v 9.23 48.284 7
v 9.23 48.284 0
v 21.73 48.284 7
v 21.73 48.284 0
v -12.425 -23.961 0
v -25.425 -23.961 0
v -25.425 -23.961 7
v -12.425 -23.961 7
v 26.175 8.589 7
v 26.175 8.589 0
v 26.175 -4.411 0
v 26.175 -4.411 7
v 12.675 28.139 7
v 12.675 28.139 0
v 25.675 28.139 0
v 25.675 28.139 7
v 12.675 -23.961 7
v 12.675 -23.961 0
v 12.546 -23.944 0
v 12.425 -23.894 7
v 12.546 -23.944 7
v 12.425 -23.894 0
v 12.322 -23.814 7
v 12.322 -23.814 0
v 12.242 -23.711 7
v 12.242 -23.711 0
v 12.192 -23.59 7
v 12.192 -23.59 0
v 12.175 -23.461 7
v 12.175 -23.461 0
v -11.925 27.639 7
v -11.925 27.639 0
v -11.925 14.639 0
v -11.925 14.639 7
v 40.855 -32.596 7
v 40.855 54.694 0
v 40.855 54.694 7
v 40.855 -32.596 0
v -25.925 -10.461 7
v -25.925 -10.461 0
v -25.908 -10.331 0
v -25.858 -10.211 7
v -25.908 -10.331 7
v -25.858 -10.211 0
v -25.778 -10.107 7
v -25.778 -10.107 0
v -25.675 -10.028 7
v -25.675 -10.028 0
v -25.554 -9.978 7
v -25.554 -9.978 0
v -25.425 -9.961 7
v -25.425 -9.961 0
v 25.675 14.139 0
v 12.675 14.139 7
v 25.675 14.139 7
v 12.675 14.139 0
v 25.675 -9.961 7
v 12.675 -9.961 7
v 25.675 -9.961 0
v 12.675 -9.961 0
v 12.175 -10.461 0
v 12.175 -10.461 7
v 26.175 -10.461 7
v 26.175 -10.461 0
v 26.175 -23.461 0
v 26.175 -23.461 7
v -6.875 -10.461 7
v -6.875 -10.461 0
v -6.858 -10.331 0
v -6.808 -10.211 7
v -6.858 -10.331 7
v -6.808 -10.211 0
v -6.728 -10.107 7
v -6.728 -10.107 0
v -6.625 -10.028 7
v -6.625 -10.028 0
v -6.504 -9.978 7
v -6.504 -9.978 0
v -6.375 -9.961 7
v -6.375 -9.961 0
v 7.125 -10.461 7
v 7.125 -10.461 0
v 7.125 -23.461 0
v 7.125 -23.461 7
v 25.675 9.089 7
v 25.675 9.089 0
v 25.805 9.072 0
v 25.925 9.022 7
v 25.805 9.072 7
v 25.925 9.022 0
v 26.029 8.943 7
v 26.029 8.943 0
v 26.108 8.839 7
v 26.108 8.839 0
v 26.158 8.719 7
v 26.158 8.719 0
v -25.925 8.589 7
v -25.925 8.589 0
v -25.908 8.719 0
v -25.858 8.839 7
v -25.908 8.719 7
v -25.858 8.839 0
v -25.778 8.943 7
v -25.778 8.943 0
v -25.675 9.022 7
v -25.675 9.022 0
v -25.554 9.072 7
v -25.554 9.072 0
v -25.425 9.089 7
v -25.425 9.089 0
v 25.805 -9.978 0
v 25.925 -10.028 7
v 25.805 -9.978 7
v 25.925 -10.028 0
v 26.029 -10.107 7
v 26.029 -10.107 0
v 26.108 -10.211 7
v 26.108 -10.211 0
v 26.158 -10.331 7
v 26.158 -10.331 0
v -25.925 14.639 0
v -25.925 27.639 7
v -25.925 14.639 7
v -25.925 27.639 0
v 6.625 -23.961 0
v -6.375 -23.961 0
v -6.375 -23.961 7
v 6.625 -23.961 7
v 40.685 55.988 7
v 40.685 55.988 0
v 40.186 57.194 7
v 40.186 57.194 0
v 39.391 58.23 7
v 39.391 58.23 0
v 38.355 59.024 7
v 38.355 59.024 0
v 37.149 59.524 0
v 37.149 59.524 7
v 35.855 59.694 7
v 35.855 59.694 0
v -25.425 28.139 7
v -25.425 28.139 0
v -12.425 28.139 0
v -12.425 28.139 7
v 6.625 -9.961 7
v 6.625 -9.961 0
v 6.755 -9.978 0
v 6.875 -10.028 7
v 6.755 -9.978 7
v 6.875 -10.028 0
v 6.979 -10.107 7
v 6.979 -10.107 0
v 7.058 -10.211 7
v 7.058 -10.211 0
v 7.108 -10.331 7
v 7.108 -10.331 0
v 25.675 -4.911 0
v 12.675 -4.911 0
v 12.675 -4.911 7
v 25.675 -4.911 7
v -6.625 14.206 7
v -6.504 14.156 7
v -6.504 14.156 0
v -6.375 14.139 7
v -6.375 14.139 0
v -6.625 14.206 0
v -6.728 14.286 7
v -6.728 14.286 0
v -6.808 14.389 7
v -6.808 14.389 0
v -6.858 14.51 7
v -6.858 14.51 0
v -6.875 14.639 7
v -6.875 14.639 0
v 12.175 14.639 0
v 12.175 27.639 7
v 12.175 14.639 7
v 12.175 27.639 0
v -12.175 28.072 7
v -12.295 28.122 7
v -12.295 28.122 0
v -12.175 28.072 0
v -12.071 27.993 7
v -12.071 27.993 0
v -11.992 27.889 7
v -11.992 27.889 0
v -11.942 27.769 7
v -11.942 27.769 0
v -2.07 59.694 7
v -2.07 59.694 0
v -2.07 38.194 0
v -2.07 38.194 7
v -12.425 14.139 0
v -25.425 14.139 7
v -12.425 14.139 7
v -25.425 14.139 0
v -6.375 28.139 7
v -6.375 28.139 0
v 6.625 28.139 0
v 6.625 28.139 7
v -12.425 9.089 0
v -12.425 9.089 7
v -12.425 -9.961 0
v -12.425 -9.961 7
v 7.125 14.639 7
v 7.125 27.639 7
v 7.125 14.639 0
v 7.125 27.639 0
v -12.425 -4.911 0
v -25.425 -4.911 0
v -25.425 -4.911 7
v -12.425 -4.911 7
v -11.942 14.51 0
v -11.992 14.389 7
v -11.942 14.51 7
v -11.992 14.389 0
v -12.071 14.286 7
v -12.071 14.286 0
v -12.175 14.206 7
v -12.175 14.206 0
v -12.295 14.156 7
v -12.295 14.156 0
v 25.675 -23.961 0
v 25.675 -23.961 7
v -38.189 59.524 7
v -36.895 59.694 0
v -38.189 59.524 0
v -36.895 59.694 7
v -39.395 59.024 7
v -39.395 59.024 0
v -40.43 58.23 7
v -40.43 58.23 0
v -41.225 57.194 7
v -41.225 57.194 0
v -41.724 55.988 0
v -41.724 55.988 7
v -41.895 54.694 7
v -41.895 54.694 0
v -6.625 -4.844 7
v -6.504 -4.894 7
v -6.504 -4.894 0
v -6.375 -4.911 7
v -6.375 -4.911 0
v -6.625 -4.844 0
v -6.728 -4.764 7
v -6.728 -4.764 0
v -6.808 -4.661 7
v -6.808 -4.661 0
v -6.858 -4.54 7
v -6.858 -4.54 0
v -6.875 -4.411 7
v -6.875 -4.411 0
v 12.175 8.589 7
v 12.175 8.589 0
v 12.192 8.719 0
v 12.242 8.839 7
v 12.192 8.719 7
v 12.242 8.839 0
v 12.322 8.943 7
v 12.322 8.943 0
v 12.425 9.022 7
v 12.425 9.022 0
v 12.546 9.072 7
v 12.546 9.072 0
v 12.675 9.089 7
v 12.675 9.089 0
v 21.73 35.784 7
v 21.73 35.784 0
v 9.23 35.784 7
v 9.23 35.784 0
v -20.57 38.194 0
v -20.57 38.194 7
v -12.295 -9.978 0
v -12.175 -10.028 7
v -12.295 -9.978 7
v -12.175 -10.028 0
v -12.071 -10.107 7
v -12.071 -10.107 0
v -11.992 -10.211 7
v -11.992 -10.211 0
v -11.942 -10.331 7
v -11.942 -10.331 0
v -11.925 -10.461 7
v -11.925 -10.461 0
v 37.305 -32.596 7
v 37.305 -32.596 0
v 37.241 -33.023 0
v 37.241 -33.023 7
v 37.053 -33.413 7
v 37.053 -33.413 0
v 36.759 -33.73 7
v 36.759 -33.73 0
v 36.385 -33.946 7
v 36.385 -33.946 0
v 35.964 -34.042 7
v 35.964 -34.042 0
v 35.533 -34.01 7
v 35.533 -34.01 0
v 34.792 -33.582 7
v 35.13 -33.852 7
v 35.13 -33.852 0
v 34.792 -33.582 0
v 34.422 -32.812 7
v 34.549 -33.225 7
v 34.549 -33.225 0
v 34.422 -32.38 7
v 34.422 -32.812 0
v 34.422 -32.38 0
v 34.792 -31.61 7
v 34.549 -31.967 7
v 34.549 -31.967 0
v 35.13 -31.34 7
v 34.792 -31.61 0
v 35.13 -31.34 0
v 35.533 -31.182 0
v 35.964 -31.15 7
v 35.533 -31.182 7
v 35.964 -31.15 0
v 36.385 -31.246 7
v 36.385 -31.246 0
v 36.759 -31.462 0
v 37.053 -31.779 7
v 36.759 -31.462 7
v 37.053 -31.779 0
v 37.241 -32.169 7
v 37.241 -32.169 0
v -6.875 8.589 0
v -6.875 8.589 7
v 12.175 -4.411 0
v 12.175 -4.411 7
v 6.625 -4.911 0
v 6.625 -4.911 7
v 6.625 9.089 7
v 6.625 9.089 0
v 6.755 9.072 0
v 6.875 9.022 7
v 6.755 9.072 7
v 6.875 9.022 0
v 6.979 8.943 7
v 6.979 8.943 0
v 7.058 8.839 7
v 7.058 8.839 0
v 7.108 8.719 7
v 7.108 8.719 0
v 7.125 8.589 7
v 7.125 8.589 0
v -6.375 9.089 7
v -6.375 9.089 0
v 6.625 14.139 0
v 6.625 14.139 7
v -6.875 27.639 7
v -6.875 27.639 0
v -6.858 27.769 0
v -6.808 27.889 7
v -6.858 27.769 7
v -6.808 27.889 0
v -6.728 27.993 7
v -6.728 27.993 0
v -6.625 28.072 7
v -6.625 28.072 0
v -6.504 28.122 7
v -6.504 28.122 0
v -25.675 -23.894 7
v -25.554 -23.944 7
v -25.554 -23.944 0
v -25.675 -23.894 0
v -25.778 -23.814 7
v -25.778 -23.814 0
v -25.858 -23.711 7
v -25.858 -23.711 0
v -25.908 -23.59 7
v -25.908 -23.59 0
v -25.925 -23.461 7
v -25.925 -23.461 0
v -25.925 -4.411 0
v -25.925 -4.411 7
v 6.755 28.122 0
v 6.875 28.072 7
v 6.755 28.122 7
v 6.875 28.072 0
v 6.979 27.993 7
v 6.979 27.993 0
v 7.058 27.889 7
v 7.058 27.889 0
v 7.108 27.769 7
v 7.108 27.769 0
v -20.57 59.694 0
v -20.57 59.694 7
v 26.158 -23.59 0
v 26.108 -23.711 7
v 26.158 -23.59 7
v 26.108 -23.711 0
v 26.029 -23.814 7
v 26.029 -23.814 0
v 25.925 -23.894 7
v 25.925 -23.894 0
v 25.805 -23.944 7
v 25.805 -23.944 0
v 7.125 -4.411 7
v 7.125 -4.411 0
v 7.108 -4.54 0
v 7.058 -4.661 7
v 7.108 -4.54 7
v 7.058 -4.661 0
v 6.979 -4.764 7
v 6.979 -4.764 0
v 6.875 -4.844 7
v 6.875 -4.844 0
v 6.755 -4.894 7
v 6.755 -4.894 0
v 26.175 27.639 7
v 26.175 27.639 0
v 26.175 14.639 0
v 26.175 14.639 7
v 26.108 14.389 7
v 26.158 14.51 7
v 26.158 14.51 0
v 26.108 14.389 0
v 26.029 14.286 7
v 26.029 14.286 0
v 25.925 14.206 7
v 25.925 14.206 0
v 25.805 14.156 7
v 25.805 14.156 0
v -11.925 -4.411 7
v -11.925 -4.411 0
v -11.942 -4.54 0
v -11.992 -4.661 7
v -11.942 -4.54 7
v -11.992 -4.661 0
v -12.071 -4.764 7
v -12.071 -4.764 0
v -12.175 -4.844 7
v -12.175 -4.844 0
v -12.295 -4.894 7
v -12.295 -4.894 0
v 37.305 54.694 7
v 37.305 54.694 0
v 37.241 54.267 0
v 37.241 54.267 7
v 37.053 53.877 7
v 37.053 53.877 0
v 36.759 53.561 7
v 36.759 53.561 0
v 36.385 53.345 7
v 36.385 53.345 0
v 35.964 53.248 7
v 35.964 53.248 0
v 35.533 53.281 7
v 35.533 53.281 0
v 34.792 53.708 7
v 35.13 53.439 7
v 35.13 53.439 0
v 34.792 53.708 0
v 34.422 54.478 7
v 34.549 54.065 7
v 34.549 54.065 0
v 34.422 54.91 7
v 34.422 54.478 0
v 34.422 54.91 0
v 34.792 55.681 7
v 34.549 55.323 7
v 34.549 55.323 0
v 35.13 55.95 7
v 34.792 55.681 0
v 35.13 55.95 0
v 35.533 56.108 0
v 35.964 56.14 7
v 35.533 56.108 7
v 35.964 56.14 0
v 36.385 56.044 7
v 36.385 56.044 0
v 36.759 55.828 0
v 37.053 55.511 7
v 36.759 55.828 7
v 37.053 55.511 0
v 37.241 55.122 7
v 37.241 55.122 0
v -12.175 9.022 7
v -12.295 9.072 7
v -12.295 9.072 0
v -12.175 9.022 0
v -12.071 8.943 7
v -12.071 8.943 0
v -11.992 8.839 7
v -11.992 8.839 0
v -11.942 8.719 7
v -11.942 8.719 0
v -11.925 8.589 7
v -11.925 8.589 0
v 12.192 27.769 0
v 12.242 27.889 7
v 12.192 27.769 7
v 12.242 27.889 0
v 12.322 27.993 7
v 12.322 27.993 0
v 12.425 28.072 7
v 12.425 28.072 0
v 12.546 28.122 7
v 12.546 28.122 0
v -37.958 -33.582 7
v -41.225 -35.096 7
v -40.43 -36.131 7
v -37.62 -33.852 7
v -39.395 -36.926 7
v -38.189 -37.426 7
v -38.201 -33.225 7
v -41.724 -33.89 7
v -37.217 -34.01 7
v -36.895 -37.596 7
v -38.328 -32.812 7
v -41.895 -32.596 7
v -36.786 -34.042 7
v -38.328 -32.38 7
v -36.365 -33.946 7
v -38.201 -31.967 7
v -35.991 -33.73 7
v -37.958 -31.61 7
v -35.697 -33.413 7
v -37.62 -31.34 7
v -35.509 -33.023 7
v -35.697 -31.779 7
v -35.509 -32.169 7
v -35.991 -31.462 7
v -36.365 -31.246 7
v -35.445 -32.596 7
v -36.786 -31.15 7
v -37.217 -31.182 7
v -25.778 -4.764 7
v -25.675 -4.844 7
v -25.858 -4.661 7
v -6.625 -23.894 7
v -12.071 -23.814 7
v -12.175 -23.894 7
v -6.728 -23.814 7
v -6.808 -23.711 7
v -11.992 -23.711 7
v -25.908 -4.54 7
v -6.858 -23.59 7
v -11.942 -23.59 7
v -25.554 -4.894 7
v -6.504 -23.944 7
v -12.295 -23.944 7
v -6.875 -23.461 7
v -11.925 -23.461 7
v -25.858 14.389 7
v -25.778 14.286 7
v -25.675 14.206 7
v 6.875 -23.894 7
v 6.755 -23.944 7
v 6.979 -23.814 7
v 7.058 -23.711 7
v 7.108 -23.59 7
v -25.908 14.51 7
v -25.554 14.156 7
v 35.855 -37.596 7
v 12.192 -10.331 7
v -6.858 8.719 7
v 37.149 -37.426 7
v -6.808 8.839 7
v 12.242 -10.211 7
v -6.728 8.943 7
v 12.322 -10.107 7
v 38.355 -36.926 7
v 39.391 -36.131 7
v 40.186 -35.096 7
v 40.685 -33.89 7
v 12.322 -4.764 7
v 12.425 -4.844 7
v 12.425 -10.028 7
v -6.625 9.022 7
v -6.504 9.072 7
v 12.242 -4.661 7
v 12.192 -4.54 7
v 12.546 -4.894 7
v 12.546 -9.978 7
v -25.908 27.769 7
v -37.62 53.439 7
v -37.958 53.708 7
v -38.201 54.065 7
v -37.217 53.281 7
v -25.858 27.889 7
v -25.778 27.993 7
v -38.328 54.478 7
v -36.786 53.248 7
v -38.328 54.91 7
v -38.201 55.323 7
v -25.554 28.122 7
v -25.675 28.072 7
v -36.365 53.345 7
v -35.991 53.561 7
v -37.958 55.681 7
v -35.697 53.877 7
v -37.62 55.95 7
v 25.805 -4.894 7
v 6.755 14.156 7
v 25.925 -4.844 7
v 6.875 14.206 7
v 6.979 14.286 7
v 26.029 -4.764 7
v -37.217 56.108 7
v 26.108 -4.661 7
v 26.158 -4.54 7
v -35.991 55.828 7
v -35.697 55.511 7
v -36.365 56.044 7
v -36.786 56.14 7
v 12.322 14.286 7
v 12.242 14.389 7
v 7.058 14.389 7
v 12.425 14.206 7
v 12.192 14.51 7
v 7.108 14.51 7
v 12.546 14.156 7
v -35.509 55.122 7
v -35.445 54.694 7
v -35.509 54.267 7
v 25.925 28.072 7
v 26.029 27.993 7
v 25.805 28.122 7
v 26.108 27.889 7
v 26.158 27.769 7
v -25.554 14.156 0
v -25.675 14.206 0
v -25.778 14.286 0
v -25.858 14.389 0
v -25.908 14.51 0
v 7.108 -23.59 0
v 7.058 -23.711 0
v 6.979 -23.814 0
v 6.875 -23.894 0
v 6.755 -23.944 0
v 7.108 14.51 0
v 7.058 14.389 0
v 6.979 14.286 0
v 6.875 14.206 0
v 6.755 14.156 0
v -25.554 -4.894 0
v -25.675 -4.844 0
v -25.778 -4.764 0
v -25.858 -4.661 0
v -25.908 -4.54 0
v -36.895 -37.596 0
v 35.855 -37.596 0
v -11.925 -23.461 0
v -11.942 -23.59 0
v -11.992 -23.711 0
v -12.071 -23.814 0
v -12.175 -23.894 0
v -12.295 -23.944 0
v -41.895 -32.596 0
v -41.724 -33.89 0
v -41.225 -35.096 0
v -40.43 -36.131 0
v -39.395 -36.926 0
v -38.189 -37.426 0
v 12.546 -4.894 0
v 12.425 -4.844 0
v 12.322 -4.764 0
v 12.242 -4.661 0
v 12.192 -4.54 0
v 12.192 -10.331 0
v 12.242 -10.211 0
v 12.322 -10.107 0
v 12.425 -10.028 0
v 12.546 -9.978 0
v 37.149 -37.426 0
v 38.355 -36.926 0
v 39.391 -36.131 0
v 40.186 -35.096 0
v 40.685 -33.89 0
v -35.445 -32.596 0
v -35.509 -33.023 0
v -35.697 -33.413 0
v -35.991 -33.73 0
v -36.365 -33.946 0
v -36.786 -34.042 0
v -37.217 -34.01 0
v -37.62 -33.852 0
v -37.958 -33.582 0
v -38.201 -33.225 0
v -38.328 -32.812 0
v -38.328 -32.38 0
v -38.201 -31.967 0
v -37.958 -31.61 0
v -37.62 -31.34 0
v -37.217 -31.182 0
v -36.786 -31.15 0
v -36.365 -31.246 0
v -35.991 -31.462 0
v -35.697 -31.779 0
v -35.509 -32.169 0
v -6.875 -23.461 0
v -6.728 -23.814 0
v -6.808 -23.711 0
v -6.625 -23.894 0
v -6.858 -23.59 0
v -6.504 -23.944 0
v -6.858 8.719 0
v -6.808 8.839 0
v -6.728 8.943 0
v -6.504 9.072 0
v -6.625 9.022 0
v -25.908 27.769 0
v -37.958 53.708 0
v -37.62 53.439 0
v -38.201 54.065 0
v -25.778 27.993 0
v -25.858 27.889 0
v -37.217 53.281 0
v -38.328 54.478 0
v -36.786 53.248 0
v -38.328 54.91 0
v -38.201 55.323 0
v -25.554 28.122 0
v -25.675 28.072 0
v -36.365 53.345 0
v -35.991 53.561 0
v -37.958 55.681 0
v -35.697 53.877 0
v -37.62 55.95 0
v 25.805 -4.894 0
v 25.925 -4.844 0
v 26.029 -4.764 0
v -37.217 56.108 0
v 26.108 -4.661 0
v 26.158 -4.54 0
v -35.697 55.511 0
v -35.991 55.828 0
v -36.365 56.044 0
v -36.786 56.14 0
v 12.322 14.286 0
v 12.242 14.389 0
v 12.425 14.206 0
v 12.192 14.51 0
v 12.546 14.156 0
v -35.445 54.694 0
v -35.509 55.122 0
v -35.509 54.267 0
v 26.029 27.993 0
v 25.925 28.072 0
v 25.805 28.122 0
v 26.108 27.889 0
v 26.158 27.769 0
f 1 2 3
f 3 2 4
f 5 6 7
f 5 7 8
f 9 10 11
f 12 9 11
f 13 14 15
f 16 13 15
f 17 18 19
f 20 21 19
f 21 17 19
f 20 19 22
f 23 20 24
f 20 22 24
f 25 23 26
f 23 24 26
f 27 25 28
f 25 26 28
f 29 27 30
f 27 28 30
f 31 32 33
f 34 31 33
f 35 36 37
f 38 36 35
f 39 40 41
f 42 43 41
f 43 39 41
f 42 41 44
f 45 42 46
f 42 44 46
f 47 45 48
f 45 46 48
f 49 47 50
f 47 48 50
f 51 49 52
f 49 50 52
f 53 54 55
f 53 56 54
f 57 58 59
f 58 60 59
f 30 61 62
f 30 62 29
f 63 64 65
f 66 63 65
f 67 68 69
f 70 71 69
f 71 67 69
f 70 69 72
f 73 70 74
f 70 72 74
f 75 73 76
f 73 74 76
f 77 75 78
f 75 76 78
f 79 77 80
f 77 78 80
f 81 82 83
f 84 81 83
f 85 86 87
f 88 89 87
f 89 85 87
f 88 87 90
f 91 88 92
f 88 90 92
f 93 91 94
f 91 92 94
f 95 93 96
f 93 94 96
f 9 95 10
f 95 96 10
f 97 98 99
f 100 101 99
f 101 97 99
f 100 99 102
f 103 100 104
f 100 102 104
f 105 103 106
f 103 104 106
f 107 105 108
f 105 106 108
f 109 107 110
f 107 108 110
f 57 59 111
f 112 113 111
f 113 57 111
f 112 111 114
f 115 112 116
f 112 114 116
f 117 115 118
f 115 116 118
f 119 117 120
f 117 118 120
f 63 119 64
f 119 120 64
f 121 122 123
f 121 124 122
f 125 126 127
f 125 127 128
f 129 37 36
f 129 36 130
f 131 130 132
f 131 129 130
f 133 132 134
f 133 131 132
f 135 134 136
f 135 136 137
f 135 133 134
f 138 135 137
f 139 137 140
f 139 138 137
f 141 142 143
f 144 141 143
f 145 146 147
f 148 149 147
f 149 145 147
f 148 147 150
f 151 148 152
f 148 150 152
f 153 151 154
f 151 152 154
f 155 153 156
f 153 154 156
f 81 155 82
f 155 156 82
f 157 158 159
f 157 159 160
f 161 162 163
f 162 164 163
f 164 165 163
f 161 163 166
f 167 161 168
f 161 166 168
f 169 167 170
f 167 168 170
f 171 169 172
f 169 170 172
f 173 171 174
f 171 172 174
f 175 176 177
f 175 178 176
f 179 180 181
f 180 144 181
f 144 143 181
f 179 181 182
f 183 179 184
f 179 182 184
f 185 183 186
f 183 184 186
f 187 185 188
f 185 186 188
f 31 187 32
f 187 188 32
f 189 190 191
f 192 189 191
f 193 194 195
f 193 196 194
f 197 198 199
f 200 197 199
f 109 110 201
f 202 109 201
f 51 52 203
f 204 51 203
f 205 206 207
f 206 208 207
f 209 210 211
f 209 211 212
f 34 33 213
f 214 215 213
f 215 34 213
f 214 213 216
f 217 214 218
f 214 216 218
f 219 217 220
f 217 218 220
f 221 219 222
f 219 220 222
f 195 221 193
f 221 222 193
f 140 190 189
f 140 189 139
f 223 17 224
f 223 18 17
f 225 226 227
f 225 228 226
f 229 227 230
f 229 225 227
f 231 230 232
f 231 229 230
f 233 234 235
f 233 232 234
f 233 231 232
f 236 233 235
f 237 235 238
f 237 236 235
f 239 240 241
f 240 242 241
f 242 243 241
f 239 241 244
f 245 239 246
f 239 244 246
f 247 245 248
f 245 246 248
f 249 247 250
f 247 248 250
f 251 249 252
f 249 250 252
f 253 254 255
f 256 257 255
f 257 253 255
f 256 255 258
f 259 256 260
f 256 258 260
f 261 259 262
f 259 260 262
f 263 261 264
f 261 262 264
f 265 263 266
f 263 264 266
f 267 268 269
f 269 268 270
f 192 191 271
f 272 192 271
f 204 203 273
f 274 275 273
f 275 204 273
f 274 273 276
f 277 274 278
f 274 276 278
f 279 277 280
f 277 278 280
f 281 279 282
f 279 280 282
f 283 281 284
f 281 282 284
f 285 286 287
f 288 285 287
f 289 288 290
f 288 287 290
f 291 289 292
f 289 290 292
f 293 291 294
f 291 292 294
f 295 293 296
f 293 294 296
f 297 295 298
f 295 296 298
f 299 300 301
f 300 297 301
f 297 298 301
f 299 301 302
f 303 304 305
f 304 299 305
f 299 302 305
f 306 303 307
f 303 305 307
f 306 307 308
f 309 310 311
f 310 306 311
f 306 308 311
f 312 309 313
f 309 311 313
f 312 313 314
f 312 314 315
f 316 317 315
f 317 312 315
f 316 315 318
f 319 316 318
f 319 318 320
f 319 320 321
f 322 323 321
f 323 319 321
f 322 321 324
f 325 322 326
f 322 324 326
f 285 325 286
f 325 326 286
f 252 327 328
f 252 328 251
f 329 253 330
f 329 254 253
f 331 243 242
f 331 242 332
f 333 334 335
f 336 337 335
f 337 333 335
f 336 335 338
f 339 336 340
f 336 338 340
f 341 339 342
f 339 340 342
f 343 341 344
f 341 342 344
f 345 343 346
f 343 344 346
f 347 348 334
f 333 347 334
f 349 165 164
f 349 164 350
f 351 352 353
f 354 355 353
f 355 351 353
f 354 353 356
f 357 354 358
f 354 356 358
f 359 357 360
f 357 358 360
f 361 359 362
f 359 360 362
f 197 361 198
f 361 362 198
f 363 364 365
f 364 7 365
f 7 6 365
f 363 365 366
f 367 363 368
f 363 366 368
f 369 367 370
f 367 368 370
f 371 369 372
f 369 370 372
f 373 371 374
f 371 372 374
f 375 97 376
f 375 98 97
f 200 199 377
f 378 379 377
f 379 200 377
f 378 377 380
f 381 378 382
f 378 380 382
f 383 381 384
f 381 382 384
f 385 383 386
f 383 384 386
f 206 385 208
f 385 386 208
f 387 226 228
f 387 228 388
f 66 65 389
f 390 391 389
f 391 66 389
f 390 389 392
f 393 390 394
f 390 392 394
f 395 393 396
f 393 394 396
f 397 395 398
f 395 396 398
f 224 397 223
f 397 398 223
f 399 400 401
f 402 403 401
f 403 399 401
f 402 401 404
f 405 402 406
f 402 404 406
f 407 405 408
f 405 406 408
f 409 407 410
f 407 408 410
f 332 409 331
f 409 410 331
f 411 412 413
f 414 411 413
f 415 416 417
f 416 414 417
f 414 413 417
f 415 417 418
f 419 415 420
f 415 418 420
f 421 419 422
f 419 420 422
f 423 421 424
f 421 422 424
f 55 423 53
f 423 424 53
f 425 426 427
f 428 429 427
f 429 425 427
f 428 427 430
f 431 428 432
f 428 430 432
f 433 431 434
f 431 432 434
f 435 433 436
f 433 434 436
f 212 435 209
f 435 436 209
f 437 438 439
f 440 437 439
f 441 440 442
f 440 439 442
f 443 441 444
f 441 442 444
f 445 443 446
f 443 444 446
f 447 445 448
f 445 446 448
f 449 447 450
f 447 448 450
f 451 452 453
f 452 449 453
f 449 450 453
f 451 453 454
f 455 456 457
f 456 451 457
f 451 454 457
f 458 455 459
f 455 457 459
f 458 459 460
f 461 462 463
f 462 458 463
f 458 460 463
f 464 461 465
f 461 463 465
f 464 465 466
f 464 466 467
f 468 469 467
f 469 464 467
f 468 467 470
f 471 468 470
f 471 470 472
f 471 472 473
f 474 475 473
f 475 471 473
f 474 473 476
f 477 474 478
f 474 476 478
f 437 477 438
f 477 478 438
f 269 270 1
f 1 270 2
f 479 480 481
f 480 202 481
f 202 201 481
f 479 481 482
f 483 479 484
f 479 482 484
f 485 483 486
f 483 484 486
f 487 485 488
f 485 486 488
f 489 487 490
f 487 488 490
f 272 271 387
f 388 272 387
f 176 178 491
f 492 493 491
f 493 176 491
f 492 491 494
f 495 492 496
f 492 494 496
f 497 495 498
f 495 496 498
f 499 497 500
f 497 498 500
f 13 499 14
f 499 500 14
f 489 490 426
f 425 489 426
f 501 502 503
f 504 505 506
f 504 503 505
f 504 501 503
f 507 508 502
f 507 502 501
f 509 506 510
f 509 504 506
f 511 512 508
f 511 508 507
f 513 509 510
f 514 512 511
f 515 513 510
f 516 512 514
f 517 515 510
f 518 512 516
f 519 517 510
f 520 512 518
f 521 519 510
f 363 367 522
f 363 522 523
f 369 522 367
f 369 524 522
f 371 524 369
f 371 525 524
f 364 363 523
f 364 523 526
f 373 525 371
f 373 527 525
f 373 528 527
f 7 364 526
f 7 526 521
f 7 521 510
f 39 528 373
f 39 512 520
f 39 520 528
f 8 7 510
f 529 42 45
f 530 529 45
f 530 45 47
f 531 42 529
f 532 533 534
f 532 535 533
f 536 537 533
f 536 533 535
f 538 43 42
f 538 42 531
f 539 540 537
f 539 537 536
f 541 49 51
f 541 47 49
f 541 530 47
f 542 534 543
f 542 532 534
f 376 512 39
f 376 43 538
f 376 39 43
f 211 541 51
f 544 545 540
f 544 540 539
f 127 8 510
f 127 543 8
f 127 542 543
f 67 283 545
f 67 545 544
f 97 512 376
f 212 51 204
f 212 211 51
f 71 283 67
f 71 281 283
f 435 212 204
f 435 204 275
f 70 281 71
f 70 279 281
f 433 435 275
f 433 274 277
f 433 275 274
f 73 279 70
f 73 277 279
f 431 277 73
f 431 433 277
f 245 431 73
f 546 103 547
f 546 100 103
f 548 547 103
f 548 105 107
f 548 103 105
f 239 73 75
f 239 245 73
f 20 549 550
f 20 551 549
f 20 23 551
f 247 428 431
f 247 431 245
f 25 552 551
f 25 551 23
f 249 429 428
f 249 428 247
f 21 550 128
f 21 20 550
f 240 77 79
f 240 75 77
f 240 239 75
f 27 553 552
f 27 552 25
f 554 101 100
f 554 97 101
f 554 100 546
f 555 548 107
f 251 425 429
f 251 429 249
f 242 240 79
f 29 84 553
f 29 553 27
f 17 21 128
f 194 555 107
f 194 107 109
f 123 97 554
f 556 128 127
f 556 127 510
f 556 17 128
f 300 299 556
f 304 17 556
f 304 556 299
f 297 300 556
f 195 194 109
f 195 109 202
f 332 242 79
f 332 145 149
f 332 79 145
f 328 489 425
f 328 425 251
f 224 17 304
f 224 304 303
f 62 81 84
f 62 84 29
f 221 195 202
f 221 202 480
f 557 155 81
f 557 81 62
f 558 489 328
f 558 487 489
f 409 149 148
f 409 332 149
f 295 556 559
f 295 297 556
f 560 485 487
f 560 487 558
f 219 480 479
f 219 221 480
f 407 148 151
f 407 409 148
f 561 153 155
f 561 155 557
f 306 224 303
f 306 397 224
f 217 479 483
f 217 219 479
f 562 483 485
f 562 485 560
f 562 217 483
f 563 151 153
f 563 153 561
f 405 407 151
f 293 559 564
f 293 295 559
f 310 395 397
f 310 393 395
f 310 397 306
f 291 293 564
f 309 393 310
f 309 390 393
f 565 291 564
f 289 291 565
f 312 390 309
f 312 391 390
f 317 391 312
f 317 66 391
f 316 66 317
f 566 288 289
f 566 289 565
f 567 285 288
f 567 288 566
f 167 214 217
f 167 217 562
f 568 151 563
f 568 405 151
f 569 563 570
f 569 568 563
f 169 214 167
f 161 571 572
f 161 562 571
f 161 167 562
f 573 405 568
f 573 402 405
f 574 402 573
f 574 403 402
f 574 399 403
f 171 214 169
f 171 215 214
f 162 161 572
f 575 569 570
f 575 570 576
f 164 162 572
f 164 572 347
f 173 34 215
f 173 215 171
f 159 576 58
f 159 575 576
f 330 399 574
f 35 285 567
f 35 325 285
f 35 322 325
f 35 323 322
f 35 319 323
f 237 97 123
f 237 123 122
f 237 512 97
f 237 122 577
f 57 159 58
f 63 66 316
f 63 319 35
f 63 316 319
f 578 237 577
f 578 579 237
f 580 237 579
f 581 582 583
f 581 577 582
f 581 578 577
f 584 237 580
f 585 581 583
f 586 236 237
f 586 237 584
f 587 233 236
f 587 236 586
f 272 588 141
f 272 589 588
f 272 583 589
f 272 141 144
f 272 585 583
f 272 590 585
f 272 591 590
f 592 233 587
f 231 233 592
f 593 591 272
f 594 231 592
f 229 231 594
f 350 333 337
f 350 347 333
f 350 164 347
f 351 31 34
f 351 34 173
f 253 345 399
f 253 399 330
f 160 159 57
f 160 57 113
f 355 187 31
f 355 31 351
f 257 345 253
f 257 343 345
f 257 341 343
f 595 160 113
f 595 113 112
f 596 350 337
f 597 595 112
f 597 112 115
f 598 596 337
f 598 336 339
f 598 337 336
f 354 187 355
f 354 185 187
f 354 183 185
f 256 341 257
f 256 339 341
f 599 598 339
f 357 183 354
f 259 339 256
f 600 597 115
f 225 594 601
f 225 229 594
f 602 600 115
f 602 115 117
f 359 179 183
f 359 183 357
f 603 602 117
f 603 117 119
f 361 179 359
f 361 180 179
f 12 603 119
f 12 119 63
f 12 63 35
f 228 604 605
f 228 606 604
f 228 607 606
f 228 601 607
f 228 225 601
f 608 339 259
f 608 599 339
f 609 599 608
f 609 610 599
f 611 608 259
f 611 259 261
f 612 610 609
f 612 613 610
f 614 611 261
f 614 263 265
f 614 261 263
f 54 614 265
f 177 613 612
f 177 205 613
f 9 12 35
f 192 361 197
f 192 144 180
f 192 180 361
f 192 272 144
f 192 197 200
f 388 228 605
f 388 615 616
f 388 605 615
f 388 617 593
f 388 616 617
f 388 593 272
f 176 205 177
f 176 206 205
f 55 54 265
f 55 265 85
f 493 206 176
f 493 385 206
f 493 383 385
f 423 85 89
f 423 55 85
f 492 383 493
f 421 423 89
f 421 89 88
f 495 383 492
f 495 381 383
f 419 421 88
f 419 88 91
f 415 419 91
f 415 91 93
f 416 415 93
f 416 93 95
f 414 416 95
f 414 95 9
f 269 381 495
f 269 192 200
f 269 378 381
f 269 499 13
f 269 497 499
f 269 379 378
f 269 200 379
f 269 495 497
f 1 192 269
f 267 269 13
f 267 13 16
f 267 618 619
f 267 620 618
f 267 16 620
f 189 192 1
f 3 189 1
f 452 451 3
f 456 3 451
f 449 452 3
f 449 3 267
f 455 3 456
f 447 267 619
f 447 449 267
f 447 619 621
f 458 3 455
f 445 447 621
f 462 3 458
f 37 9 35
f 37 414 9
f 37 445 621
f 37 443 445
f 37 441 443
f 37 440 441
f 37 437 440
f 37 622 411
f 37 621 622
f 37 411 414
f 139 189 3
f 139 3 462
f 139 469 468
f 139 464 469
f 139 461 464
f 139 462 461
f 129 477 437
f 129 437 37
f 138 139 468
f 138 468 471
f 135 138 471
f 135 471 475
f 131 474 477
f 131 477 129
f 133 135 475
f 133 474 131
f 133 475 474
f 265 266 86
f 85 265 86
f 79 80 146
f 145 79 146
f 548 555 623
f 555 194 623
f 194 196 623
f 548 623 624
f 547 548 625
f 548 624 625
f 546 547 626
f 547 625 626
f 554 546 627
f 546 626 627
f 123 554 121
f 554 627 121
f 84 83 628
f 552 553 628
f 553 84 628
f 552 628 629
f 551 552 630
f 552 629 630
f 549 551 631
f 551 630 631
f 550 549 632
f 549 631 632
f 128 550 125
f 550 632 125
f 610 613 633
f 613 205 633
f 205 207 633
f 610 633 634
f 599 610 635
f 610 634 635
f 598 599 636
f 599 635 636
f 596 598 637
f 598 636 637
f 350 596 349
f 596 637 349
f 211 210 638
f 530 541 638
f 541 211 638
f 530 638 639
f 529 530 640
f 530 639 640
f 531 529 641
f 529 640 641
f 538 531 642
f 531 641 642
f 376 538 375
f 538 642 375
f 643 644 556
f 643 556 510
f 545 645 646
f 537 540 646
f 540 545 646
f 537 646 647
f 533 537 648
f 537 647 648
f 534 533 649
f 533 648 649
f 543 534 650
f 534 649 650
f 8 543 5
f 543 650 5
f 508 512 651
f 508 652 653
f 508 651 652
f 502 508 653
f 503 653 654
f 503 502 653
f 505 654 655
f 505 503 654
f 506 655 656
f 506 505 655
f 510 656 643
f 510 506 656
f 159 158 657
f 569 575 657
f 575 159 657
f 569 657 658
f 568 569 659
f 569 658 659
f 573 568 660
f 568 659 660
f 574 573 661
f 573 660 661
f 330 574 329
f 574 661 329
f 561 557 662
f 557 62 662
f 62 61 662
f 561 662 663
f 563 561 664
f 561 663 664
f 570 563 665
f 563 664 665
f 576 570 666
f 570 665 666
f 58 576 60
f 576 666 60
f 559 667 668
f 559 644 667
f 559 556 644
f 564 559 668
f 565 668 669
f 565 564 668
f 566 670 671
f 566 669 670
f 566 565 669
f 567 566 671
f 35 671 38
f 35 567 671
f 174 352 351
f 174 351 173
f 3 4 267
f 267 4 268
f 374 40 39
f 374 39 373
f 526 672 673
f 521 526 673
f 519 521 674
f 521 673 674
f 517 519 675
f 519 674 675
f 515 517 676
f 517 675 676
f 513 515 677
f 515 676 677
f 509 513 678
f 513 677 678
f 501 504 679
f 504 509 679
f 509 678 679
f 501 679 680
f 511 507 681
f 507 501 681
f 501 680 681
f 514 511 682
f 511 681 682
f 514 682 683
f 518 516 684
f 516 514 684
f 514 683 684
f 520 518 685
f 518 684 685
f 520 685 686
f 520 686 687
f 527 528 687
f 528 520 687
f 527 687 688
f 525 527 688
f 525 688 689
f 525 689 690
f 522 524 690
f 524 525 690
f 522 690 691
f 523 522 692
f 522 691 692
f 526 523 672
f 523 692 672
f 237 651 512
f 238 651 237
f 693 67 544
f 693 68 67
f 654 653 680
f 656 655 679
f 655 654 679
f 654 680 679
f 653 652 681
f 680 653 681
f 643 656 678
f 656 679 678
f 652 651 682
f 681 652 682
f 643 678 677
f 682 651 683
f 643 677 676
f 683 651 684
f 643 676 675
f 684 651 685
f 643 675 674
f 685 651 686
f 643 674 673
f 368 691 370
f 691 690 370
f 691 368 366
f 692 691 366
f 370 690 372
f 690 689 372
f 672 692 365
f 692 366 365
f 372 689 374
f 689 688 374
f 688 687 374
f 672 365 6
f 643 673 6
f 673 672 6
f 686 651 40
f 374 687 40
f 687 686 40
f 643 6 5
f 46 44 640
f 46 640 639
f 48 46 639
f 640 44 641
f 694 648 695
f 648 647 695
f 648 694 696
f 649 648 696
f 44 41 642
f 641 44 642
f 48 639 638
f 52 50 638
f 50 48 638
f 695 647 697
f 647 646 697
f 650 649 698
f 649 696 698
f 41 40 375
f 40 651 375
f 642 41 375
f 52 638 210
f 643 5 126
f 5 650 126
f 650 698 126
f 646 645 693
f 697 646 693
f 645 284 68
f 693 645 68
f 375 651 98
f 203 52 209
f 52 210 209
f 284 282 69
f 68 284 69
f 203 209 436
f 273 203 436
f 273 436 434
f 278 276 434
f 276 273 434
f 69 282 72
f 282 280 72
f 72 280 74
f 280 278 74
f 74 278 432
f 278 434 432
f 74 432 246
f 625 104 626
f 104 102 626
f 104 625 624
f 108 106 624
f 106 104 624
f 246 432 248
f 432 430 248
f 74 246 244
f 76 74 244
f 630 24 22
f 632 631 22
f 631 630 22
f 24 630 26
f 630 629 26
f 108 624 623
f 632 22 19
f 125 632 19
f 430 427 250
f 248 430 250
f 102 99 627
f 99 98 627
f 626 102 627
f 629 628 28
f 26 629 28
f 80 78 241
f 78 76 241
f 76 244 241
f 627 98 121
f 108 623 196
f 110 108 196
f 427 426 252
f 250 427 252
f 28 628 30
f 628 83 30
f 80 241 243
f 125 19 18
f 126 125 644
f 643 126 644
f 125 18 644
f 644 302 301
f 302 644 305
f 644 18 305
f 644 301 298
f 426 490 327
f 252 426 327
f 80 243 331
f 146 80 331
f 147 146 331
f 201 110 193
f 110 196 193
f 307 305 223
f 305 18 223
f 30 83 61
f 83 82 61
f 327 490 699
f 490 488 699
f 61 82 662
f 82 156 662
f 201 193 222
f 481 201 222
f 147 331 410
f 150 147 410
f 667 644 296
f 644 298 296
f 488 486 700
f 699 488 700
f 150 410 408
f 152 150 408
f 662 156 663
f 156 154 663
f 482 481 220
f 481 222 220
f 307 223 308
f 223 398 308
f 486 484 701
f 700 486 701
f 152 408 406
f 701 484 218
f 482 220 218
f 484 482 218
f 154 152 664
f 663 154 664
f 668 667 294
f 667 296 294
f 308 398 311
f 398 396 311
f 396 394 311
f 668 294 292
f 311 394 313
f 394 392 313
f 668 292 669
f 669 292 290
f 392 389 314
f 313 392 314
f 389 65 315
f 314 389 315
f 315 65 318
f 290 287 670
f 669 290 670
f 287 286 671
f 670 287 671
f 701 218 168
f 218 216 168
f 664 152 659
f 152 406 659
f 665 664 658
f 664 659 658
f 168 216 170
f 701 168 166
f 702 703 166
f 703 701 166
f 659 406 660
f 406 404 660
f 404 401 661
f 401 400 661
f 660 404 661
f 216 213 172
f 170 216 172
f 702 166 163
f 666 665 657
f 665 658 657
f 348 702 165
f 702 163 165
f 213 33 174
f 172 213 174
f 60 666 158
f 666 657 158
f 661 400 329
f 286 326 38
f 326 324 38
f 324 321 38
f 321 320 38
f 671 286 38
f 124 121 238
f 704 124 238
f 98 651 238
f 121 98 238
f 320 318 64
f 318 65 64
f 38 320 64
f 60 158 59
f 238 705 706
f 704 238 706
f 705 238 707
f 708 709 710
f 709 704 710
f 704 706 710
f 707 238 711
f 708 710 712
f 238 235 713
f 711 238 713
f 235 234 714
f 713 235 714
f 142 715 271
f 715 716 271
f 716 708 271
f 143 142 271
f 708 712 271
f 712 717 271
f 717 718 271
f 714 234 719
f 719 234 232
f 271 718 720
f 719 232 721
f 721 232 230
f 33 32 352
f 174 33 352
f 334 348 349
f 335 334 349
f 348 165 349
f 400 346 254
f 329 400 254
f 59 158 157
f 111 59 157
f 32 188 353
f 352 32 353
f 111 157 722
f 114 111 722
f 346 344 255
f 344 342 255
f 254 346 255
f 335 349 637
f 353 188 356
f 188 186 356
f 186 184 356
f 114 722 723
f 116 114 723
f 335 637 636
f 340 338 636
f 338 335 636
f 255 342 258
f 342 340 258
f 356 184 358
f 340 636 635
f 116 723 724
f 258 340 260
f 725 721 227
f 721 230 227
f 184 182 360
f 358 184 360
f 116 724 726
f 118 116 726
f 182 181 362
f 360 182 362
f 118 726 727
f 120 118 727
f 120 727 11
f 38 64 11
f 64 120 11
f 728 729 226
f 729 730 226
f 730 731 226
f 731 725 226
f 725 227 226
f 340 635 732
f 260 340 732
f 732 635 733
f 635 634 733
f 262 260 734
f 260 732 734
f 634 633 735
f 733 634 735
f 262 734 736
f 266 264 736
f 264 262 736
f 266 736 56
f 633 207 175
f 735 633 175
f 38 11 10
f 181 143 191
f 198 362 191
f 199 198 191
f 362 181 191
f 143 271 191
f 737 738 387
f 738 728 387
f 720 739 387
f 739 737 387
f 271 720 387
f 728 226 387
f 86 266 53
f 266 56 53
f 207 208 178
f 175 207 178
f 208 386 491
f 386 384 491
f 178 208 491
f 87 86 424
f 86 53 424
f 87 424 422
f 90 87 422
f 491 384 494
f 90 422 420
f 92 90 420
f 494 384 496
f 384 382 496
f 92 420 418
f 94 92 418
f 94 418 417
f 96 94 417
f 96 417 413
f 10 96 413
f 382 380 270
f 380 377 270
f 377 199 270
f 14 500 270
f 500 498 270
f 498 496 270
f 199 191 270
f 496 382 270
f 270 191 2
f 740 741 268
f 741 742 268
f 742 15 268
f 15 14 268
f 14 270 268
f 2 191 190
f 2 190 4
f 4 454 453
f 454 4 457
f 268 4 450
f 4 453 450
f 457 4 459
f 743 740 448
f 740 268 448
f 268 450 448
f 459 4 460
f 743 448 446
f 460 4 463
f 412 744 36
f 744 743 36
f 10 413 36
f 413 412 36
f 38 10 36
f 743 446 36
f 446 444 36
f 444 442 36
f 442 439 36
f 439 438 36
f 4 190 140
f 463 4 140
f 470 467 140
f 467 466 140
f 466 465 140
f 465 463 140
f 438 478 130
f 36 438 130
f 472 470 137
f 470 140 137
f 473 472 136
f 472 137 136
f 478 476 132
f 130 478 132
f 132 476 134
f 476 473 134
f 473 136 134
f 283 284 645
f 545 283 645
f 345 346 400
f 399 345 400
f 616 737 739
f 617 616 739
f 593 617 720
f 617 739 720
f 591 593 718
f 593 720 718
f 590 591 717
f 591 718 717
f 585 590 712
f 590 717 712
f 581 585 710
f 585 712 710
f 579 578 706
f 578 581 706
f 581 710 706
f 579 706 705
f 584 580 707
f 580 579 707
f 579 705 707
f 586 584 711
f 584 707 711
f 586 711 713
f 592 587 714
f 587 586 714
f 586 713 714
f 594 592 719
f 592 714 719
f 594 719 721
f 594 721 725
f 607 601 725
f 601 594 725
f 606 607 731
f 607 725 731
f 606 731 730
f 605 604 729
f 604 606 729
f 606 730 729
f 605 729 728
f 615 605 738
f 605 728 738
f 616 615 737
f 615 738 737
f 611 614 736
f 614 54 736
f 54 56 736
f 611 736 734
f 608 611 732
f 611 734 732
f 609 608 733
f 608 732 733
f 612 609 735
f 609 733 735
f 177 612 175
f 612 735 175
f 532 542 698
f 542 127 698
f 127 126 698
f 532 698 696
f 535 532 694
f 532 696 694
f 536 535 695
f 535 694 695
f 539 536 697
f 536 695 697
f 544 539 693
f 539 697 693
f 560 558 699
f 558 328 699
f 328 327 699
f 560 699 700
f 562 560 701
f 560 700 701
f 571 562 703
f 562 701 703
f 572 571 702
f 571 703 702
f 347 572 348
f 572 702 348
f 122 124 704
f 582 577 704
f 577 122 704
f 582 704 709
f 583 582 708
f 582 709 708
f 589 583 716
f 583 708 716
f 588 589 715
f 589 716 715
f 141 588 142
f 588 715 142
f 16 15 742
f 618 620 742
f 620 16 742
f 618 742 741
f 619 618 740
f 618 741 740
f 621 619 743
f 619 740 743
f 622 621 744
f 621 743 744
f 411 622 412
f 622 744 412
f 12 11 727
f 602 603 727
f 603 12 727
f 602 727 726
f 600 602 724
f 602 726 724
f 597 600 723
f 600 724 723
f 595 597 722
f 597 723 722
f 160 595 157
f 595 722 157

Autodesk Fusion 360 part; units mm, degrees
sketch "Sketch1" plane through (0, 0, 0) normal (0, 0, 1) x (1, 0, 0)
  line L0 (40.8554, 59.6943) -> (40.8554, -37.5959)
  line L1 (-41.8946, 59.6943) -> (40.8554, 59.6943)
  line L2 (-41.8946, -37.5959) -> (-41.8946, 59.6943)
  line L3 (40.8554, -37.5959) -> (-41.8946, -37.5959)
  line L4 (-25.4246, 28.1391) -> (-12.4246, 28.1391)
  line L5 (-25.4246, 14.1391) -> (-12.4246, 14.1391)
  line L6 (-25.9246, 27.6391) -> (-25.9246, 14.6391)
  line L7 (-11.9246, 27.6391) -> (-11.9246, 14.6391)
  arc A0 (-25.4246, 28.1391) -> (-25.9246, 27.6391) centre (-25.4246, 27.6391) ccw
  arc A1 (-11.9246, 27.6391) -> (-12.4246, 28.1391) centre (-12.4246, 27.6391) ccw
  arc A2 (-25.9246, 14.6391) -> (-25.4246, 14.1391) centre (-25.4246, 14.6391) ccw
  arc A3 (-12.4246, 14.1391) -> (-11.9246, 14.6391) centre (-12.4246, 14.6391) ccw
  line L8 (-6.3746, 28.1391) -> (6.6254, 28.1391)
  line L9 (-6.3746, 14.1391) -> (6.6254, 14.1391)
  line L10 (-6.8746, 27.6391) -> (-6.8746, 14.6391)
  line L11 (7.1254, 27.6391) -> (7.1254, 14.6391)
  arc A4 (-6.3746, 28.1391) -> (-6.8746, 27.6391) centre (-6.3746, 27.6391) ccw
  arc A5 (7.1254, 27.6391) -> (6.6254, 28.1391) centre (6.6254, 27.6391) ccw
  arc A6 (-6.8746, 14.6391) -> (-6.3746, 14.1391) centre (-6.3746, 14.6391) ccw
  arc A7 (6.6254, 14.1391) -> (7.1254, 14.6391) centre (6.6254, 14.6391) ccw
  line L12 (12.6754, 28.1391) -> (25.6754, 28.1391)
  line L13 (12.6754, 14.1391) -> (25.6754, 14.1391)
  line L14 (12.1754, 27.6391) -> (12.1754, 14.6391)
  line L15 (26.1754, 27.6391) -> (26.1754, 14.6391)
  arc A8 (12.6754, 28.1391) -> (12.1754, 27.6391) centre (12.6754, 27.6391) ccw
  arc A9 (26.1754, 27.6391) -> (25.6754, 28.1391) centre (25.6754, 27.6391) ccw
  arc A10 (12.1754, 14.6391) -> (12.6754, 14.1391) centre (12.6754, 14.6391) ccw
  arc A11 (25.6754, 14.1391) -> (26.1754, 14.6391) centre (25.6754, 14.6391) ccw
  line L16 (-25.4246, 9.0891) -> (-12.4246, 9.0891)
  line L17 (-25.4246, -4.9109) -> (-12.4246, -4.9109)
  line L18 (-25.9246, 8.5891) -> (-25.9246, -4.4109)
  line L19 (-11.9246, 8.5891) -> (-11.9246, -4.4109)
  arc A12 (-25.4246, 9.0891) -> (-25.9246, 8.5891) centre (-25.4246, 8.5891) ccw
  arc A13 (-11.9246, 8.5891) -> (-12.4246, 9.0891) centre (-12.4246, 8.5891) ccw
  arc A14 (-25.9246, -4.4109) -> (-25.4246, -4.9109) centre (-25.4246, -4.4109) ccw
  arc A15 (-12.4246, -4.9109) -> (-11.9246, -4.4109) centre (-12.4246, -4.4109) ccw
  line L20 (-6.3746, 9.0891) -> (6.6254, 9.0891)
  line L21 (-6.3746, -4.9109) -> (6.6254, -4.9109)
  line L22 (-6.8746, 8.5891) -> (-6.8746, -4.4109)
  line L23 (7.1254, 8.5891) -> (7.1254, -4.4109)
  arc A16 (-6.3746, 9.0891) -> (-6.8746, 8.5891) centre (-6.3746, 8.5891) ccw
  arc A17 (7.1254, 8.5891) -> (6.6254, 9.0891) centre (6.6254, 8.5891) ccw
  arc A18 (-6.8746, -4.4109) -> (-6.3746, -4.9109) centre (-6.3746, -4.4109) ccw
  arc A19 (6.6254, -4.9109) -> (7.1254, -4.4109) centre (6.6254, -4.4109) ccw
  line L24 (12.6754, 9.0891) -> (25.6754, 9.0891)
  line L25 (12.6754, -4.9109) -> (25.6754, -4.9109)
  line L26 (12.1754, 8.5891) -> (12.1754, -4.4109)
  line L27 (26.1754, 8.5891) -> (26.1754, -4.4109)
  arc A20 (12.6754, 9.0891) -> (12.1754, 8.5891) centre (12.6754, 8.5891) ccw
  arc A21 (26.1754, 8.5891) -> (25.6754, 9.0891) centre (25.6754, 8.5891) ccw
  arc A22 (12.1754, -4.4109) -> (12.6754, -4.9109) centre (12.6754, -4.4109) ccw
  arc A23 (25.6754, -4.9109) -> (26.1754, -4.4109) centre (25.6754, -4.4109) ccw
  line L28 (-25.4246, -9.9609) -> (-12.4246, -9.9609)
  line L29 (-25.4246, -23.9609) -> (-12.4246, -23.9609)
  line L30 (-25.9246, -10.4609) -> (-25.9246, -23.4609)
  line L31 (-11.9246, -10.4609) -> (-11.9246, -23.4609)
  arc A24 (-25.4246, -9.9609) -> (-25.9246, -10.4609) centre (-25.4246, -10.4609) ccw
  arc A25 (-11.9246, -10.4609) -> (-12.4246, -9.9609) centre (-12.4246, -10.4609) ccw
  arc A26 (-25.9246, -23.4609) -> (-25.4246, -23.9609) centre (-25.4246, -23.4609) ccw
  arc A27 (-12.4246, -23.9609) -> (-11.9246, -23.4609) centre (-12.4246, -23.4609) ccw
  line L32 (-6.3746, -9.9609) -> (6.6254, -9.9609)
  line L33 (-6.3746, -23.9609) -> (6.6254, -23.9609)
  line L34 (-6.8746, -10.4609) -> (-6.8746, -23.4609)
  line L35 (7.1254, -10.4609) -> (7.1254, -23.4609)
  arc A28 (-6.3746, -9.9609) -> (-6.8746, -10.4609) centre (-6.3746, -10.4609) ccw
  arc A29 (7.1254, -10.4609) -> (6.6254, -9.9609) centre (6.6254, -10.4609) ccw
  arc A30 (-6.8746, -23.4609) -> (-6.3746, -23.9609) centre (-6.3746, -23.4609) ccw
  arc A31 (6.6254, -23.9609) -> (7.1254, -23.4609) centre (6.6254, -23.4609) ccw
  line L36 (12.6754, -9.9609) -> (25.6754, -9.9609)
  line L37 (12.6754, -23.9609) -> (25.6754, -23.9609)
  line L38 (12.1754, -10.4609) -> (12.1754, -23.4609)
  line L39 (26.1754, -10.4609) -> (26.1754, -23.4609)
  arc A32 (12.6754, -9.9609) -> (12.1754, -10.4609) centre (12.6754, -10.4609) ccw
  arc A33 (26.1754, -10.4609) -> (25.6754, -9.9609) centre (25.6754, -10.4609) ccw
  arc A34 (12.1754, -23.4609) -> (12.6754, -23.9609) centre (12.6754, -23.4609) ccw
  arc A35 (25.6754, -23.9609) -> (26.1754, -23.4609) centre (25.6754, -23.4609) ccw
  line L40 (9.2304, 48.2841) -> (21.7304, 48.2841)
  line L41 (21.7304, 48.2841) -> (21.7304, 35.7841)
  line L42 (21.7304, 35.7841) -> (9.2304, 35.7841)
  line L43 (9.2304, 35.7841) -> (9.2304, 48.2841)
  line L44 (-20.5696, 59.6943) -> (-2.0696, 59.6943)
  line L45 (-2.0696, 59.6943) -> (-2.0696, 38.1943)
  line L46 (-2.0696, 38.1943) -> (-20.5696, 38.1943)
  line L47 (-20.5696, 38.1943) -> (-20.5696, 59.6943)
  circle A36 centre (-36.8946, 54.6943) radius 1.45
  circle A37 centre (35.8554, 54.6943) radius 1.45
  circle A38 centre (35.8554, -32.5959) radius 1.45
  circle A39 centre (-36.8946, -32.5959) radius 1.45
  dimension "d1" = 14.68
  dimension "d2" = 13.635
  dimension "d3" = 12.5
  dimension "d4" = 12.5
  dimension "d5" = 19.125
  dimension "d6" = 7.645
  dimension "d7" = 18.5
  dimension "d8" = 21.5
  dimension "d9" = 11.3
  dimension "d10" = 2.9
  dimension "d11" = 5
  dimension "d12" = 5
  dimension "d13" = 2.9
  dimension "d14" = 5
  dimension "d15" = 5
  dimension "d16" = 2.9
  dimension "d17" = 5
  dimension "d18" = 5
  dimension "d19" = 2.9
  dimension "d20" = 5
  dimension "d21" = 5
extrude "Extrude1" add sketch "Sketch1" along normal blind 7 contours L0 L1 L2 L3 L45 L46 L47
fillet "Fillet1" radius 5 4 edges at (-41.8946, 59.6943, 3.5) (-41.8946, -37.5959, 3.5) (40.8554, -37.5959, 3.5) (40.8554, 59.6943, 3.5)
